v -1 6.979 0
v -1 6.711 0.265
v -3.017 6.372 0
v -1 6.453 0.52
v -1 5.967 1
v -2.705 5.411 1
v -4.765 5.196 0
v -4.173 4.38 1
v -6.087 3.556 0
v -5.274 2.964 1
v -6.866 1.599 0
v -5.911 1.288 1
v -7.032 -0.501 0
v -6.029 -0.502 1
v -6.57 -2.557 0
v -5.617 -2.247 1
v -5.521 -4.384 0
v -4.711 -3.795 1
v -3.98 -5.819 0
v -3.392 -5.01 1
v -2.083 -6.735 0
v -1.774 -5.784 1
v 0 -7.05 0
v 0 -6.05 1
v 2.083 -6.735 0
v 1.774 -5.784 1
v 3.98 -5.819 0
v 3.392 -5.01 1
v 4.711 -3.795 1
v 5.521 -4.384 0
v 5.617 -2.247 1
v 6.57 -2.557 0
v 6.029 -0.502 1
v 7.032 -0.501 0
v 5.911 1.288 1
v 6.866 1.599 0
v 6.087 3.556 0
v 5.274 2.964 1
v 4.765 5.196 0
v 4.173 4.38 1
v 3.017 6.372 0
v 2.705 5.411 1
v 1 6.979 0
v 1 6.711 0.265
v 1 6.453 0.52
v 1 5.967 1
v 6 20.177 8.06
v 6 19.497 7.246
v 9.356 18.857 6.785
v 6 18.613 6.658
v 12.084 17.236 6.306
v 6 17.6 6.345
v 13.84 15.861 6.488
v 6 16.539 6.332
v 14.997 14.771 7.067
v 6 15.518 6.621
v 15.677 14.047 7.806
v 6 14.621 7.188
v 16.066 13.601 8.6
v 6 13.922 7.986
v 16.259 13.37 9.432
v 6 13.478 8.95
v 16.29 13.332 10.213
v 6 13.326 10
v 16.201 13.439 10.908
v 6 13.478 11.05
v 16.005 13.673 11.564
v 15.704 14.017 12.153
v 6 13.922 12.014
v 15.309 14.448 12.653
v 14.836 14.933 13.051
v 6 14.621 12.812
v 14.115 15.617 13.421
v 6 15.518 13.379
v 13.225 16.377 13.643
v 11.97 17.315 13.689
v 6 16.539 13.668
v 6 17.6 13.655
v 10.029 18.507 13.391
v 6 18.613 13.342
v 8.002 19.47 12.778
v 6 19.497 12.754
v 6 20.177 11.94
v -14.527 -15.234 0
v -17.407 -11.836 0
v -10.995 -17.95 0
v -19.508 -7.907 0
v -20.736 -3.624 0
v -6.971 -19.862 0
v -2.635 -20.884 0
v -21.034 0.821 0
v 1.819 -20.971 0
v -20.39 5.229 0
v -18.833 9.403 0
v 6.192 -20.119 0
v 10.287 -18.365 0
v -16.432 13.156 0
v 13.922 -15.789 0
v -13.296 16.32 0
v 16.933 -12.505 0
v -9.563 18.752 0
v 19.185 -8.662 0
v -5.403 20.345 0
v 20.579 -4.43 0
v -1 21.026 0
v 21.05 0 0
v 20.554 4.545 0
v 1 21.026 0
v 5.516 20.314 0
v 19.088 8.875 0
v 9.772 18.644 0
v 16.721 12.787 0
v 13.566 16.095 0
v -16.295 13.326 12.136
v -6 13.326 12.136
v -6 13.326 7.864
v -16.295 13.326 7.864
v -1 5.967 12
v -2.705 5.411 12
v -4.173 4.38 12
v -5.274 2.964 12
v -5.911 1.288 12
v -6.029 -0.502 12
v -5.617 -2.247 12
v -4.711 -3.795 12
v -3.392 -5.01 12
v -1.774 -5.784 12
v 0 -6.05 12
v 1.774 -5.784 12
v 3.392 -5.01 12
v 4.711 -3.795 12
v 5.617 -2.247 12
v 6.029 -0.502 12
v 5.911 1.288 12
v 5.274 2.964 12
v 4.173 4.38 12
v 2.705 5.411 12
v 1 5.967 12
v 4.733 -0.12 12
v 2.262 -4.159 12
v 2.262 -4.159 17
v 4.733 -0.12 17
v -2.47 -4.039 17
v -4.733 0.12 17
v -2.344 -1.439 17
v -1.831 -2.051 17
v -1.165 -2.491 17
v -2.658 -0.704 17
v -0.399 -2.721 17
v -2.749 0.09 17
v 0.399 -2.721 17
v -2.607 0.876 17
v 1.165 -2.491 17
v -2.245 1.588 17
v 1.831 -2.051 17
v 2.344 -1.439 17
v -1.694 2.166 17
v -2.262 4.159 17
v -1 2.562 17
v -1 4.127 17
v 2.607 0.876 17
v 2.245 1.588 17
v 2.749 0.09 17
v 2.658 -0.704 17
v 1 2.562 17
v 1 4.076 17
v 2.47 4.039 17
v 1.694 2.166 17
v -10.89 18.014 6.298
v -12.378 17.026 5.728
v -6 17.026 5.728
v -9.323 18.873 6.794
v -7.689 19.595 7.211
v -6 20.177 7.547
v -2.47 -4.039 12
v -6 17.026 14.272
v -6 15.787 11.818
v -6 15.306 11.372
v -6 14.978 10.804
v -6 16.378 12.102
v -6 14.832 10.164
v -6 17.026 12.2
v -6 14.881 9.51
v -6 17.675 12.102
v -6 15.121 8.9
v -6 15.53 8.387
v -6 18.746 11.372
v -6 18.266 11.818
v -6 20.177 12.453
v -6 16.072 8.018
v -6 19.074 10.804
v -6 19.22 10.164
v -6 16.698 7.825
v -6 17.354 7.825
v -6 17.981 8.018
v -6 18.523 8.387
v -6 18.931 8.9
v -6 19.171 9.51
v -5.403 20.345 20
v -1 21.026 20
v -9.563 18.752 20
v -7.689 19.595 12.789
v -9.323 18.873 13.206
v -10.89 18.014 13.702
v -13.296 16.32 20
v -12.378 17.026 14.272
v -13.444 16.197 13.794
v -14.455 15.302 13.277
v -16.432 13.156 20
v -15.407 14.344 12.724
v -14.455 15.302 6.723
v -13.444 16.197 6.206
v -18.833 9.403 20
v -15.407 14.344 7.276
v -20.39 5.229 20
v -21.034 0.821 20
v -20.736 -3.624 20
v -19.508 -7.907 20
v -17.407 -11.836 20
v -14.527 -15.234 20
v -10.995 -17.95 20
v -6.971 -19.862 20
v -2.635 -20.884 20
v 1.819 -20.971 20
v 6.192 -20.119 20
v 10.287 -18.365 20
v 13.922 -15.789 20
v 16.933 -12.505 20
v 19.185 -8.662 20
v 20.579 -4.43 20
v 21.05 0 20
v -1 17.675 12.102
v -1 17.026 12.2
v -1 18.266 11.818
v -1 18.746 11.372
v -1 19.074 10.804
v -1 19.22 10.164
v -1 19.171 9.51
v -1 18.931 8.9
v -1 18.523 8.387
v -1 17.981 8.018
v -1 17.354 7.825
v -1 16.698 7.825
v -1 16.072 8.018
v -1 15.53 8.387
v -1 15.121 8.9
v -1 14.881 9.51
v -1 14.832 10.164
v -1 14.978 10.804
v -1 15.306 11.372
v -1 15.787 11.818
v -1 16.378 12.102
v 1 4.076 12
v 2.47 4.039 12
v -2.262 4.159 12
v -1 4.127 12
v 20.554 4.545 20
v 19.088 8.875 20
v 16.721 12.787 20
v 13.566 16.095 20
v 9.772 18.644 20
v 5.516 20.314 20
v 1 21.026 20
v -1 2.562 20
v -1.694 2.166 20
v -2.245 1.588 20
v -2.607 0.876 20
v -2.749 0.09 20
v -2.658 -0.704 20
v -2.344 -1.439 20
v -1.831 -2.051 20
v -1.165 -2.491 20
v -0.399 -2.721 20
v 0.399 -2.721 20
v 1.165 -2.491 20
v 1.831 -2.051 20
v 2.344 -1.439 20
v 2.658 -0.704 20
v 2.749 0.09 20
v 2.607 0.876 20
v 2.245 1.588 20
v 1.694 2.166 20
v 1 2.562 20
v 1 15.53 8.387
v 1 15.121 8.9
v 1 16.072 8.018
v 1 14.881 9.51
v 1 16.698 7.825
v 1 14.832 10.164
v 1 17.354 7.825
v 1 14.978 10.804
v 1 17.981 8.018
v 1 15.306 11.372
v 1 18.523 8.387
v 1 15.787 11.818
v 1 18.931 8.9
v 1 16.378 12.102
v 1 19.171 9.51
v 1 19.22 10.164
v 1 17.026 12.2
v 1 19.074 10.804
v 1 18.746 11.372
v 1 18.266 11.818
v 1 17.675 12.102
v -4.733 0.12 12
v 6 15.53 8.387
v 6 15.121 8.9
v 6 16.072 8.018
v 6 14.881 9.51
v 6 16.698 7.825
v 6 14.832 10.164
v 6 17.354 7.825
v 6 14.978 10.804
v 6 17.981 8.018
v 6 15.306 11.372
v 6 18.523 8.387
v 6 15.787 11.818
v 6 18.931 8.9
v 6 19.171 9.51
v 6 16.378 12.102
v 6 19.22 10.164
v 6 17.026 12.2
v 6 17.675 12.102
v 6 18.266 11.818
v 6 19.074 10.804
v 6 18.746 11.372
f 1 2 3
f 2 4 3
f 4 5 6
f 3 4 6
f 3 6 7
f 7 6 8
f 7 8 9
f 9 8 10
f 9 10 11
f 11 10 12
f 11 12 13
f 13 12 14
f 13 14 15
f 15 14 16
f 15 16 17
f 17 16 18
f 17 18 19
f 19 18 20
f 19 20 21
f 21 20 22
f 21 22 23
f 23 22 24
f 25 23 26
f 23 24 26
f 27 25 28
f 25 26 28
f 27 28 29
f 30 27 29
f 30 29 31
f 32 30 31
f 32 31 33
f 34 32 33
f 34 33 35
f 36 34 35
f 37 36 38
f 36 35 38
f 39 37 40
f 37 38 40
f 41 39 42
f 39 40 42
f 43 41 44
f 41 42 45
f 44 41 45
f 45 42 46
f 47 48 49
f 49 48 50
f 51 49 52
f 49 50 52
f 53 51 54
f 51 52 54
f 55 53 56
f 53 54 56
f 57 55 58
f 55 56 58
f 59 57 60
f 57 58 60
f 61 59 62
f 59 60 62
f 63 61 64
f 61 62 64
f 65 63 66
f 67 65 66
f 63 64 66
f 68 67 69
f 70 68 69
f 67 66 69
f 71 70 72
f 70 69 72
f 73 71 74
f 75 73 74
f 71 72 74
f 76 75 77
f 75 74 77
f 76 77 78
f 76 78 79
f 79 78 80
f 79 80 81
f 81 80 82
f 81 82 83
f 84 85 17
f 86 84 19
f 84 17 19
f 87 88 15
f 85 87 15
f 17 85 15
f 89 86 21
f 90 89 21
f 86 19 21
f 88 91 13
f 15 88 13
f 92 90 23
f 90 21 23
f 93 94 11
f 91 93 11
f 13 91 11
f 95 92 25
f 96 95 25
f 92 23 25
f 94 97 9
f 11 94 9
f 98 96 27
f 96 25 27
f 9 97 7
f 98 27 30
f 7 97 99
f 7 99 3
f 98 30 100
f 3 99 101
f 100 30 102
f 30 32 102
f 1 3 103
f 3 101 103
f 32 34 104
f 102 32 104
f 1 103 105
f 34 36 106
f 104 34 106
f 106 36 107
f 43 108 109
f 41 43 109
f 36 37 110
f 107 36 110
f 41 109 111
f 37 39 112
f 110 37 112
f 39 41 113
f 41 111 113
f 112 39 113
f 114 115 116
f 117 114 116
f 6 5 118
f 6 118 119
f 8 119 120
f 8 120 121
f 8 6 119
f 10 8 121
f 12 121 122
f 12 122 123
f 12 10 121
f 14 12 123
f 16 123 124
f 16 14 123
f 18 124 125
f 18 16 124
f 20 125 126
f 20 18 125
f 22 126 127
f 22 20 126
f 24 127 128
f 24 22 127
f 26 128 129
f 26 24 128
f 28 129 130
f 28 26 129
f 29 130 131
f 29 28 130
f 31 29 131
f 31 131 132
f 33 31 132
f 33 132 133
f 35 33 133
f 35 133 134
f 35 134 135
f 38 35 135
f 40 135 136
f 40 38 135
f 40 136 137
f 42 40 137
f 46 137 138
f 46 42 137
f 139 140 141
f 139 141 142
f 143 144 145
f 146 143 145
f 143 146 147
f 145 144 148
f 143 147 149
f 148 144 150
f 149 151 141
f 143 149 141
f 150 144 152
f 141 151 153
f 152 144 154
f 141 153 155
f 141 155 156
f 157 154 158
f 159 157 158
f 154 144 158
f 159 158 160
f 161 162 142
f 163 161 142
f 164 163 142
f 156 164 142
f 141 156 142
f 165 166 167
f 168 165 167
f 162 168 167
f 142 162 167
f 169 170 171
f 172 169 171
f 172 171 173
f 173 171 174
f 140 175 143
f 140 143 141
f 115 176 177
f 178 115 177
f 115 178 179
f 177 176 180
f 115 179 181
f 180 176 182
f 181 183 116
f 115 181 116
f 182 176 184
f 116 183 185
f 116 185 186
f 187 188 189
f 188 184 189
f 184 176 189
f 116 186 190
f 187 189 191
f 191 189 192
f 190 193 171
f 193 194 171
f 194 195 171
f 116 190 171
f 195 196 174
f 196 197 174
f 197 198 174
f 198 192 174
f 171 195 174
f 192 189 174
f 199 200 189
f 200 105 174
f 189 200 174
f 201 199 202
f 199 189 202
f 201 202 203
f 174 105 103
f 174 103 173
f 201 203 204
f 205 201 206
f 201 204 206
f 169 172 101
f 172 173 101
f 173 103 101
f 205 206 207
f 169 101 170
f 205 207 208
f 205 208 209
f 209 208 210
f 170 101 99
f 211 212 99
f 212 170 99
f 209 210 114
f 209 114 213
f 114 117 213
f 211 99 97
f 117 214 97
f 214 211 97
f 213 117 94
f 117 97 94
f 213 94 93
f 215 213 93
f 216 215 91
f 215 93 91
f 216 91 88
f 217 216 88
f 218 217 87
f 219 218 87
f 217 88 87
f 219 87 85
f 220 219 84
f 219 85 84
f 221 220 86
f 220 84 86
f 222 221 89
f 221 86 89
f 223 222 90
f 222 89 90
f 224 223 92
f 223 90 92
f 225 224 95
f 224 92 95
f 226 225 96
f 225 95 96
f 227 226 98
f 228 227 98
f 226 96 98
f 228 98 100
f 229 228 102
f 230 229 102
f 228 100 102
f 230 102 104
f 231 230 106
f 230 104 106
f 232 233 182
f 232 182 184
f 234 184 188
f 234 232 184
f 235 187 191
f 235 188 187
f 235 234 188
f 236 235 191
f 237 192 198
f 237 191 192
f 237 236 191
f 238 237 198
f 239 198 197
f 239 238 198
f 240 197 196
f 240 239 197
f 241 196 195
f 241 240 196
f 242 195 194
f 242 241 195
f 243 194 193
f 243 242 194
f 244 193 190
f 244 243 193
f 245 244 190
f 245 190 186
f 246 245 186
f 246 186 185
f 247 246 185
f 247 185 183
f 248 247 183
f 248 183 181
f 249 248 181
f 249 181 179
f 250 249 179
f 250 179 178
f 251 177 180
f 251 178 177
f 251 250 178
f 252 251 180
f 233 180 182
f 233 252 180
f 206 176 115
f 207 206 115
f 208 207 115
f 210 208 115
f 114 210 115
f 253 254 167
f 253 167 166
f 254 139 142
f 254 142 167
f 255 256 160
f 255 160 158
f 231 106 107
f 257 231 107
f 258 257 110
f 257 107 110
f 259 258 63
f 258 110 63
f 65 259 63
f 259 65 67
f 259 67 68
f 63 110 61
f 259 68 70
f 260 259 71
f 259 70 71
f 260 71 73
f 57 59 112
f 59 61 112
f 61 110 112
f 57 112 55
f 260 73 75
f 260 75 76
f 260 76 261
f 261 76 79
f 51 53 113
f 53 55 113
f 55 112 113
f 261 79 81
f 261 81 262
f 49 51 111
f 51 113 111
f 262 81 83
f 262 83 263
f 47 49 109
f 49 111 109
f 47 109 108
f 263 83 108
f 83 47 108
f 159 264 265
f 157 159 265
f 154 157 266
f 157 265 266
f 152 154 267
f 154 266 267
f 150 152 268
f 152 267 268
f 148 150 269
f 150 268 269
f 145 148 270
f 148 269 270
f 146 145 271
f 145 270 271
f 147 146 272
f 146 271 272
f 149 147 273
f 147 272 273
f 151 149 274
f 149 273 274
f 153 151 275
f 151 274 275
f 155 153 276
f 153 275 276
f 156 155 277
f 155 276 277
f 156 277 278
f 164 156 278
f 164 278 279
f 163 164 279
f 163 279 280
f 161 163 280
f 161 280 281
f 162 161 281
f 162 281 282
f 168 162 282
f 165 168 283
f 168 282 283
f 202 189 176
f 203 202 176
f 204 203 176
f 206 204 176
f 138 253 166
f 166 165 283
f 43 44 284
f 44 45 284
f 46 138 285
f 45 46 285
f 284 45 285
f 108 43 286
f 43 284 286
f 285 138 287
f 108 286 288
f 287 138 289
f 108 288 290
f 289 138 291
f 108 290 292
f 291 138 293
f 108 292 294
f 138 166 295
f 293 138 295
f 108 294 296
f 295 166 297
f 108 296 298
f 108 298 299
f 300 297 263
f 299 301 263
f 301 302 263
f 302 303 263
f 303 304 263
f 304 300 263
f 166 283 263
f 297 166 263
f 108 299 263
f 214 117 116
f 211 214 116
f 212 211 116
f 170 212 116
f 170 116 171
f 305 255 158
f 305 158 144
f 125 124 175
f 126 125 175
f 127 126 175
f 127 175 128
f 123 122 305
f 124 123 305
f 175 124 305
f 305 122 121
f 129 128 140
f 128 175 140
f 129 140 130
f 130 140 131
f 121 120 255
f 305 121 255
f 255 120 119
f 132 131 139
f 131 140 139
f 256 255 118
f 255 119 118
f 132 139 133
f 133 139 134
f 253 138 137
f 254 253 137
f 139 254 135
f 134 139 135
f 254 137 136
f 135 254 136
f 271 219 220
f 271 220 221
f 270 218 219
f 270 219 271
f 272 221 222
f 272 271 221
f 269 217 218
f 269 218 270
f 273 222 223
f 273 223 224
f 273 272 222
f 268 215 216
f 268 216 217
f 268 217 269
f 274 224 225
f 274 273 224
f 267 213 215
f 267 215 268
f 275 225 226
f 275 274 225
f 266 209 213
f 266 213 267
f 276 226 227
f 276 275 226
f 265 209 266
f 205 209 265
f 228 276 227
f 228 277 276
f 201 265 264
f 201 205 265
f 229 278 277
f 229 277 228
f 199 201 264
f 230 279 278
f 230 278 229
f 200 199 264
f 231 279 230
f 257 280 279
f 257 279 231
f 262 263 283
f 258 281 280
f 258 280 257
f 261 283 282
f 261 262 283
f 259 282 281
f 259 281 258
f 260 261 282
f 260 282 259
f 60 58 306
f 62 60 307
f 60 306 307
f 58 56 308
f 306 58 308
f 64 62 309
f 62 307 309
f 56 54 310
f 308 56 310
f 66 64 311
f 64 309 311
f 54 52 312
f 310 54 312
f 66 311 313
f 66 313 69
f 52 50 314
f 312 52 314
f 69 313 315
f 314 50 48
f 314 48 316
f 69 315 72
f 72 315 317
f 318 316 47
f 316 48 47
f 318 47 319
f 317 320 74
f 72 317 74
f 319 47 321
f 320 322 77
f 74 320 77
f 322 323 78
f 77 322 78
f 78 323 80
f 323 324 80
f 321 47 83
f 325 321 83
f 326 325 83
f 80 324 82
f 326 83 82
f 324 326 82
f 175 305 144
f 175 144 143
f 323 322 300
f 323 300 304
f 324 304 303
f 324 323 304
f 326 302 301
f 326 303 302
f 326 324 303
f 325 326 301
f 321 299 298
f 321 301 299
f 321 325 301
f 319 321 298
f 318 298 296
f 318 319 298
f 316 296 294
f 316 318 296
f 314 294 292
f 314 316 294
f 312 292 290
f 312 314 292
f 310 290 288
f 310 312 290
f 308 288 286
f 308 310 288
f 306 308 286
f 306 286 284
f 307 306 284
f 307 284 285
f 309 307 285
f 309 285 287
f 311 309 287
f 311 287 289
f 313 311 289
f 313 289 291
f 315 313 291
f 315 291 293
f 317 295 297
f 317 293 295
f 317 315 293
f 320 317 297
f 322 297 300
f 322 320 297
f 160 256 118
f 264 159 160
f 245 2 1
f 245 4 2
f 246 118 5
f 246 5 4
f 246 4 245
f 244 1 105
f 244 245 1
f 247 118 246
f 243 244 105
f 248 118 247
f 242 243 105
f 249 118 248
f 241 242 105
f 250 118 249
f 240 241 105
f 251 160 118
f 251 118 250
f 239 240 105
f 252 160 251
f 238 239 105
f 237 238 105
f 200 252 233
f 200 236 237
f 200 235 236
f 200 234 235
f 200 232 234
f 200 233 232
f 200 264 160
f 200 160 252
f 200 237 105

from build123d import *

# Parameters (mm, degrees)
SCHIZZO1_R                    = 21.05
SCHIZZO1_R_2                  = 6.05
ESTRUSIONE_ESTRUSIONE1_DEPTH  = 20
ESTRUSIONE_ESTRUSIONE2_START  = -8
SCHIZZO6_R                    = 6.05
ESTRUSIONE_ESTRUSIONE2_DEPTH  = 8
SCHIZZO8_R                    = 2.75
ESTRUSIONE_ESTRUSIONE3_DEPTH  = 3
SCHIZZO2_W                    = 2
SCHIZZO2_H                    = 24.903468066
TAGLIO_ESTRUSIONE1_DEPTH      = 20
TAGLIO_ESTRUSIONE2_DEPTH      = 37.459635215
TAGLIO_ESTRUSIONE2_DEPTH_BACK = 37.459635215
SCHIZZO3_R                    = 2.2
TAGLIO_ESTRUSIONE3_START      = -5
SCHIZZO4_R                    = 3.7
TAGLIO_ESTRUSIONE3_DEPTH      = 20
TAGLIO_ESTRUSIONE4_START      = -5
TAGLIO_ESTRUSIONE4_DEPTH      = 20
SMUSSO1_SIZE                  = 1


with BuildPart() as part:
    # Schizzo1 → Estrusione-Estrusione1 (new body)
    with BuildSketch(Plane.XY):
        Circle(SCHIZZO1_R)
        Circle(SCHIZZO1_R_2, mode=Mode.SUBTRACT)
    extrude(amount=ESTRUSIONE_ESTRUSIONE1_DEPTH)

    # Schizzo6 → Estrusione-Estrusione2 (add)
    with BuildSketch(Plane.XY.offset(20).offset(ESTRUSIONE_ESTRUSIONE2_START)):
        Circle(SCHIZZO6_R)
        Polygon((2.470277929, 4.03869537), (-2.262473824, 4.158671125), (-4.732751753, 0.119975756), (-2.470277929, -4.03869537), (2.262473824, -4.158671125), (4.732751753, -0.119975756), align=None, mode=Mode.SUBTRACT)
    extrude(amount=ESTRUSIONE_ESTRUSIONE2_DEPTH)

    # Schizzo8 → Estrusione-Estrusione3 (add)
    with BuildSketch(Plane.XY.offset(20)):
        Polygon((-2.262473824, 4.158671125), (-4.732751753, 0.119975756), (-2.470277929, -4.03869537), (2.262473824, -4.158671125), (4.732751753, -0.119975756), (2.470277929, 4.03869537), align=None)
        Circle(SCHIZZO8_R, mode=Mode.SUBTRACT)
    extrude(amount=-ESTRUSIONE_ESTRUSIONE3_DEPTH)

    # Schizzo2 → Taglio-Estrusione1 (cut)
    with BuildSketch(Plane.XY.offset(20)):
        with Locations((0, 13.402032425)):
            Rectangle(SCHIZZO2_W, SCHIZZO2_H)
    extrude(amount=-TAGLIO_ESTRUSIONE1_DEPTH, mode=Mode.SUBTRACT)

    # Schizzo3 → Taglio-Estrusione2 (cut, two sides: drawn at the far end of the back side and taken through both)
    with BuildSketch(Plane.ZY.offset(-1).offset(-TAGLIO_ESTRUSIONE2_DEPTH_BACK)):
        with Locations((10, 17.026233614)):
            Circle(SCHIZZO3_R)
    extrude(amount=TAGLIO_ESTRUSIONE2_DEPTH + TAGLIO_ESTRUSIONE2_DEPTH_BACK, mode=Mode.SUBTRACT)

    # Schizzo4 → Taglio-Estrusione3 (cut)
    with BuildSketch(Plane.ZY.offset(-1).offset(TAGLIO_ESTRUSIONE3_START)):
        with Locations((10, 17.026233614)):
            Circle(SCHIZZO4_R)
    extrude(amount=-TAGLIO_ESTRUSIONE3_DEPTH, mode=Mode.SUBTRACT)

    # Schizzo5 → Taglio-Estrusione4 (cut)
    with BuildSketch(Plane(origin=(-1, 0, 0), x_dir=(0, 0, -1), z_dir=(1, 0, 0)).offset(TAGLIO_ESTRUSIONE4_START)):
        Polygon((-7.863804004, 20.726233614), (-12.136195996, 20.726233614), (-14.272391992, 17.026233614), (-12.136195996, 13.326233614), (-7.863804004, 13.326233614), (-5.727608008, 17.026233614), align=None)
    extrude(amount=-TAGLIO_ESTRUSIONE4_DEPTH, mode=Mode.SUBTRACT)

    # Smusso1
    smusso1_edges = [part.edges().sort_by_distance(p)[0] for p in [
        (0, -6.05, 0),
    ]]
    chamfer(smusso1_edges, length=SMUSSO1_SIZE)


solid = part.part
